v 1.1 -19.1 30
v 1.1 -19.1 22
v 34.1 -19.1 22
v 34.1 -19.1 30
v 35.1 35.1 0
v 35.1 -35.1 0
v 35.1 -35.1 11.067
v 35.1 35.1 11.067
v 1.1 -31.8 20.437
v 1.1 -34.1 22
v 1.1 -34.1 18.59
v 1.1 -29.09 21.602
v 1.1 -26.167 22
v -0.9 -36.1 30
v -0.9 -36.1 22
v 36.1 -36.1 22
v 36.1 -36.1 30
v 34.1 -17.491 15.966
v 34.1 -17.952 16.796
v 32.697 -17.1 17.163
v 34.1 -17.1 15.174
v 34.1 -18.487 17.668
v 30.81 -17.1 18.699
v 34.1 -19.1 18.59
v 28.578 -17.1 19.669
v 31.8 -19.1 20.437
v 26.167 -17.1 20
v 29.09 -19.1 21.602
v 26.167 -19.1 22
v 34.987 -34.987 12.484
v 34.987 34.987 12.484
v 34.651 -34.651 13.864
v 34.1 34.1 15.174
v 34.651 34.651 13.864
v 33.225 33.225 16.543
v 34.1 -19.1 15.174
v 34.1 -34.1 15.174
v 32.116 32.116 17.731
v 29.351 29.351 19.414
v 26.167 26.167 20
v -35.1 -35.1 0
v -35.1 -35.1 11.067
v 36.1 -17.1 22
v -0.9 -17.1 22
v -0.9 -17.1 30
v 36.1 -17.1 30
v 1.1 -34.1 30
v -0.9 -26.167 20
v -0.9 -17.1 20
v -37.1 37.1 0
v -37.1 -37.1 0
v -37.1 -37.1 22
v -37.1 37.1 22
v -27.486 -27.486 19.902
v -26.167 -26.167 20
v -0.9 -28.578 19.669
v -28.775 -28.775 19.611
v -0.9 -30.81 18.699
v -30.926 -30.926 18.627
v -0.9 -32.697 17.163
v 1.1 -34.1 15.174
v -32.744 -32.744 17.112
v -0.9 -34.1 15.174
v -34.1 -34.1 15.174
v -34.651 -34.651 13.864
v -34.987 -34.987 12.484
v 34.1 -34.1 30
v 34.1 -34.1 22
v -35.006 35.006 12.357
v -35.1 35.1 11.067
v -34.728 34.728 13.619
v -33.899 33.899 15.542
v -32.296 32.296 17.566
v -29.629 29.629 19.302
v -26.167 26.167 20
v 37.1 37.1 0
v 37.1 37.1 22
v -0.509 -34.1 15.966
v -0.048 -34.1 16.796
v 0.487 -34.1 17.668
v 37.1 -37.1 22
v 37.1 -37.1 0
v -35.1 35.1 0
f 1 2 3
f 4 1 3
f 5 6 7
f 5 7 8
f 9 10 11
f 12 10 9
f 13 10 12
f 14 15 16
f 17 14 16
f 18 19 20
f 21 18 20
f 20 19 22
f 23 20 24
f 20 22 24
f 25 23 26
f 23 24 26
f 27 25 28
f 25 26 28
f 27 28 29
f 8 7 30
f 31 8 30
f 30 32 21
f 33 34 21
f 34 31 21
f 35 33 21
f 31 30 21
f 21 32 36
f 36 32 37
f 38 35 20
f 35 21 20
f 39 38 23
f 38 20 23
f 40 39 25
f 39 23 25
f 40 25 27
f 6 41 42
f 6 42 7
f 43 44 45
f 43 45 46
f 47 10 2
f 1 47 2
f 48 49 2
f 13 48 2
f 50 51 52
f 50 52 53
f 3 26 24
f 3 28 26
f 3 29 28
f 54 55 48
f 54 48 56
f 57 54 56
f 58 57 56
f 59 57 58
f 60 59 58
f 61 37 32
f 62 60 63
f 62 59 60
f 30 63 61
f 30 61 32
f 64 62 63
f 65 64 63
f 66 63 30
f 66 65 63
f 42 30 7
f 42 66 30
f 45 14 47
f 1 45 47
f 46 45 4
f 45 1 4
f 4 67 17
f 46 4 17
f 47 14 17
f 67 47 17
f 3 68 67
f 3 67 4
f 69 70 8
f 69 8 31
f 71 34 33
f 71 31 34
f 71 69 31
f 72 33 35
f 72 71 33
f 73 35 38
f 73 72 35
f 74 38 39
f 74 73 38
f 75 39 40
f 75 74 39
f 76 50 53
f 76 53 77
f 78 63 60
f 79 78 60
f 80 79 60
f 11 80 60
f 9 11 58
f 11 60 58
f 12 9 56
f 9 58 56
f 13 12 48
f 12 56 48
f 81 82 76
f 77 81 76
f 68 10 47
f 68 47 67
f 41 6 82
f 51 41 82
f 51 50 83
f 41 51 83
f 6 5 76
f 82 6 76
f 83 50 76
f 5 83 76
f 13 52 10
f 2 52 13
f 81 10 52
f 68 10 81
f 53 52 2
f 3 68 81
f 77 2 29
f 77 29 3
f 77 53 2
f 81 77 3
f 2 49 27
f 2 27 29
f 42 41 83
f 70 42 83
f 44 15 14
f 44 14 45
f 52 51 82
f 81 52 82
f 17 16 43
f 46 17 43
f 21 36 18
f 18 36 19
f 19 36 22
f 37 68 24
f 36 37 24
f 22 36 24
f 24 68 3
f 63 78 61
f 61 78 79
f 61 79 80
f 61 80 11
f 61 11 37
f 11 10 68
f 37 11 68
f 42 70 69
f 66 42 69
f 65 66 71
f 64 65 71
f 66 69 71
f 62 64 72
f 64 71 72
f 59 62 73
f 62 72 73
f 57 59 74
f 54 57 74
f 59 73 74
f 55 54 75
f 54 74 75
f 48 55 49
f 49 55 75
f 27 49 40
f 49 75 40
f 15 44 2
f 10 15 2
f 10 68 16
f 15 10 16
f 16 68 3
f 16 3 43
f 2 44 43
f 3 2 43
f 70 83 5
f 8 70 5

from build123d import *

# Parameters (mm, degrees)
F0_W          = 70.2
F0_H          = 70.2
F1_DEPTH      = 20
F2_T          = 2
F3_W          = 33
F3_H          = 15
F4_DEPTH      = 25
F5_DEPTH      = 25
F6_T          = 2
F7_W          = 2
F7_H          = 6.9346216321
F7_W_2        = 33
F7_H_2        = 10.0653783679
F8_DEPTH      = 25
F9_T1_DEPTH   = 70.2
F9_T3_DEPTH   = 70.2
F9_T8_DEPTH   = 70.2
F9_T14_DEPTH  = 70.2
F9_T20_DEPTH  = 70.2
F9_T27_DEPTH  = 70.2
F9_T33_DEPTH  = 70.2
F9_T39_DEPTH  = 70.2
F9_T45_DEPTH  = 70.2
F9_T51_DEPTH  = 70.2
F9_T58_DEPTH  = 70.2
F9_T64_DEPTH  = 70.2
F10_T1_DEPTH  = 25.0674098192
F10_T6_ANGLE  = 95.6264745755
F10_T11_ANGLE = 95.6264745755
F10_T16_DEPTH = 14.2107757951


# Not quite as in the source:
# - a fillet or chamfer that OpenCascade refuses, or shapes differently, is made with other operations: its cross-section is extruded or revolved along the edge and cut away or added


with BuildPart() as f1:
    # F0 (on Top) → F1 (new body)
    with BuildSketch(Plane.XY):
        Rectangle(F0_W, F0_H)
    extrude(amount=F1_DEPTH)

    # F2
    f2_openings = [f1.faces().sort_by_distance(p)[0] for p in [
        (0, 0, 0),
    ]]
    offset(amount=F2_T, openings=f2_openings, kind=Kind.INTERSECTION)

    # F3 (on face) → F4 (cut)
    with BuildSketch(Plane.XY.offset(22)):
        with Locations((17.6, -26.6)):
            Rectangle(F3_W, F3_H)
    extrude(amount=-F4_DEPTH, mode=Mode.SUBTRACT)

    # F9: fillet of radius 8.9325901808 on 4 edges, made by hand

    # F9_s2 → F9_t1 (join)
    with BuildSketch(Plane.YZ.offset(-35.1)):
        with BuildLine():
            ThreePointArc((35.1, 11.0674098192), (32.4837049096, 17.3837049096), (26.1674098192, 20))
            Line((26.1674098192, 20), (35.1, 20))
            Line((35.1, 20), (35.1, 11.0674098192))
        make_face()
    extrude(amount=F9_T1_DEPTH)

    # F9_s4 → F9_t3 (join)
    with BuildSketch(Plane.XZ.offset(-35.1)):
        with BuildLine():
            ThreePointArc((-35.1, 11.0674098192), (-32.4837049096, 17.3837049096), (-26.1674098192, 20))
            Line((-26.1674098192, 20), (-35.1, 20))
            Line((-35.1, 20), (-35.1, 11.0674098192))
        make_face()
    extrude(amount=F9_T3_DEPTH)


with BuildPart() as f5:
    # F3 (on face) → F5 (new body)
    with BuildSketch(Plane.XY.offset(22)):
        with Locations((17.6, -26.6)):
            Rectangle(F3_W, F3_H)
    extrude(amount=F5_DEPTH)

    # F6
    f6_openings = [f5.faces().sort_by_distance(p)[0] for p in [
        (17.6, -26.6, 22),
    ]]
    offset(amount=F6_T, openings=f6_openings, kind=Kind.INTERSECTION)

    # F7 (on face) → F8 (cut)
    with BuildSketch(Plane.XZ.offset(36.1)):
        with Locations((0.1, 33.467310816)):
            Rectangle(F7_W, F7_H)
        with Locations((17.6, 33.467310816)):
            Rectangle(F7_W_2, F7_H)
        Polygon((-0.9, 49), (-0.9, 36.9346216321), (1.1, 36.9346216321), (1.1, 47), (34.1, 47), (34.1, 36.9346216321), (36.1, 36.9346216321), (36.1, 49), align=None)
        with Locations((35.1, 33.467310816)):
            Rectangle(F7_W, F7_H)
        with Locations((17.6, 41.967310816)):
            Rectangle(F7_W_2, F7_H_2)
    extrude(amount=-F8_DEPTH, mode=Mode.SUBTRACT)


with BuildPart() as f9_tool6:
    # F9_s7 → F9_t8 (new body)
    with BuildSketch(Plane.XZ.offset(35.1)):
        with BuildLine():
            ThreePointArc((35.1, 11.0674098192), (32.4837049096, 17.3837049096), (26.1674098192, 20))
            Line((26.1674098192, 20), (35.1, 20))
            Line((35.1, 20), (35.1, 11.0674098192))
        make_face()
    extrude(amount=-F9_T8_DEPTH)

    split(bisect_by=Plane.XZ.offset(34.1), keep=Keep.TOP)

    split(bisect_by=Plane.YZ.offset(34.1), keep=Keep.TOP)


with BuildPart() as f1_1:
    add(f1.part)

    # F9_t5: union F9_tool6
    add(f9_tool6.part)


with BuildPart() as f9_tool12:
    # F9_s13 → F9_t14 (new body)
    with BuildSketch(Plane.XZ.offset(35.1)):
        with BuildLine():
            ThreePointArc((35.1, 11.0674098192), (32.4837049096, 17.3837049096), (26.1674098192, 20))
            Line((26.1674098192, 20), (35.1, 20))
            Line((35.1, 20), (35.1, 11.0674098192))
        make_face()
    extrude(amount=-F9_T14_DEPTH)

    split(bisect_by=Plane.XZ.offset(34.1), keep=Keep.TOP)

    split(bisect_by=Plane.YZ.offset(34.1), keep=Keep.BOTTOM)


with BuildPart() as f1_2:
    add(f1_1.part)

    # F9_t11: union F9_tool12
    add(f9_tool12.part)


with BuildPart() as f9_tool18:
    # F9_s19 → F9_t20 (new body)
    with BuildSketch(Plane.XZ.offset(35.1)):
        with BuildLine():
            ThreePointArc((35.1, 11.0674098192), (32.4837049096, 17.3837049096), (26.1674098192, 20))
            Line((26.1674098192, 20), (35.1, 20))
            Line((35.1, 20), (35.1, 11.0674098192))
        make_face()
    extrude(amount=-F9_T20_DEPTH)

    split(bisect_by=Plane.XZ.offset(19.1), keep=Keep.TOP)

    split(bisect_by=Plane.XZ.offset(34.1), keep=Keep.BOTTOM)

    split(bisect_by=Plane.YZ.offset(34.1), keep=Keep.TOP)


with BuildPart() as f1_3:
    add(f1_2.part)

    # F9_t17: union F9_tool18
    add(f9_tool18.part)


with BuildPart() as f9_tool25:
    # F9_s26 → F9_t27 (new body)
    with BuildSketch(Plane.XZ.offset(35.1)):
        with BuildLine():
            ThreePointArc((35.1, 11.0674098192), (32.4837049096, 17.3837049096), (26.1674098192, 20))
            Line((26.1674098192, 20), (35.1, 20))
            Line((35.1, 20), (35.1, 11.0674098192))
        make_face()
    extrude(amount=-F9_T27_DEPTH)

    split(bisect_by=Plane.XZ.offset(19.1), keep=Keep.BOTTOM)

    split(bisect_by=Plane.YZ.offset(34.1), keep=Keep.TOP)


with BuildPart() as f1_4:
    add(f1_3.part)

    # F9_t24: union F9_tool25
    add(f9_tool25.part)


with BuildPart() as f9_tool31:
    # F9_s32 → F9_t33 (new body)
    with BuildSketch(Plane.XZ.offset(35.1)):
        with BuildLine():
            ThreePointArc((35.1, 11.0674098192), (32.4837049096, 17.3837049096), (26.1674098192, 20))
            Line((26.1674098192, 20), (35.1, 20))
            Line((35.1, 20), (35.1, 11.0674098192))
        make_face()
    extrude(amount=-F9_T33_DEPTH)

    split(bisect_by=Plane.XZ.offset(19.1), keep=Keep.BOTTOM)

    split(bisect_by=Plane.YZ.offset(34.1), keep=Keep.BOTTOM)


with BuildPart() as f1_5:
    add(f1_4.part)

    # F9_t30: union F9_tool31
    add(f9_tool31.part)


with BuildPart() as f9_tool37:
    # F9_s38 → F9_t39 (new body)
    with BuildSketch(Plane.YZ.offset(-35.1)):
        with BuildLine():
            ThreePointArc((-26.1674098192, 20), (-32.4837049096, 17.3837049096), (-35.1, 11.0674098192))
            Line((-35.1, 11.0674098192), (-35.1, 20))
            Line((-35.1, 20), (-26.1674098192, 20))
        make_face()
    extrude(amount=F9_T39_DEPTH)

    split(bisect_by=Plane.YZ.offset(1.1), keep=Keep.BOTTOM)

    split(bisect_by=Plane.XZ.offset(34.1), keep=Keep.BOTTOM)


with BuildPart() as f1_6:
    add(f1_5.part)

    # F9_t36: union F9_tool37
    add(f9_tool37.part)


with BuildPart() as f9_tool43:
    # F9_s44 → F9_t45 (new body)
    with BuildSketch(Plane.YZ.offset(-35.1)):
        with BuildLine():
            ThreePointArc((-26.1674098192, 20), (-32.4837049096, 17.3837049096), (-35.1, 11.0674098192))
            Line((-35.1, 11.0674098192), (-35.1, 20))
            Line((-35.1, 20), (-26.1674098192, 20))
        make_face()
    extrude(amount=F9_T45_DEPTH)

    split(bisect_by=Plane.YZ.offset(1.1), keep=Keep.BOTTOM)

    split(bisect_by=Plane.XZ.offset(34.1), keep=Keep.TOP)


with BuildPart() as f1_7:
    add(f1_6.part)

    # F9_t42: union F9_tool43
    add(f9_tool43.part)


with BuildPart() as f9_tool49:
    # F9_s50 → F9_t51 (new body)
    with BuildSketch(Plane.YZ.offset(-35.1)):
        with BuildLine():
            ThreePointArc((-26.1674098192, 20), (-32.4837049096, 17.3837049096), (-35.1, 11.0674098192))
            Line((-35.1, 11.0674098192), (-35.1, 20))
            Line((-35.1, 20), (-26.1674098192, 20))
        make_face()
    extrude(amount=F9_T51_DEPTH)

    split(bisect_by=Plane.YZ.offset(1.1), keep=Keep.TOP)

    split(bisect_by=Plane.XZ.offset(34.1), keep=Keep.TOP)

    split(bisect_by=Plane.YZ.offset(34.1), keep=Keep.BOTTOM)


with BuildPart() as f1_8:
    add(f1_7.part)

    # F9_t48: union F9_tool49
    add(f9_tool49.part)


with BuildPart() as f9_tool56:
    # F9_s57 → F9_t58 (new body)
    with BuildSketch(Plane.YZ.offset(-35.1)):
        with BuildLine():
            ThreePointArc((-26.1674098192, 20), (-32.4837049096, 17.3837049096), (-35.1, 11.0674098192))
            Line((-35.1, 11.0674098192), (-35.1, 20))
            Line((-35.1, 20), (-26.1674098192, 20))
        make_face()
    extrude(amount=F9_T58_DEPTH)

    split(bisect_by=Plane.XZ.offset(34.1), keep=Keep.BOTTOM)

    split(bisect_by=Plane.YZ.offset(34.1), keep=Keep.TOP)


with BuildPart() as f1_9:
    add(f1_8.part)

    # F9_t55: union F9_tool56
    add(f9_tool56.part)


with BuildPart() as f9_tool62:
    # F9_s63 → F9_t64 (new body)
    with BuildSketch(Plane.YZ.offset(-35.1)):
        with BuildLine():
            ThreePointArc((-26.1674098192, 20), (-32.4837049096, 17.3837049096), (-35.1, 11.0674098192))
            Line((-35.1, 11.0674098192), (-35.1, 20))
            Line((-35.1, 20), (-26.1674098192, 20))
        make_face()
    extrude(amount=F9_T64_DEPTH)

    split(bisect_by=Plane.XZ.offset(34.1), keep=Keep.TOP)

    split(bisect_by=Plane.YZ.offset(34.1), keep=Keep.TOP)


with BuildPart() as f1_10:
    add(f1_9.part)

    # F9_t61: union F9_tool62
    add(f9_tool62.part)

    # F10: chamfer of 2 on 6 edges, made by hand

    # F10_s2 → F10_t1 (cut)
    with BuildSketch(Plane.YZ.offset(1.1)):
        Polygon((-17.1, 20), (-19.1, 22), (-19.1, 20), align=None)
    extrude(amount=F10_T1_DEPTH, mode=Mode.SUBTRACT)


with BuildPart() as f10_tool4:
    # F10_s5 → F10_t6 (revolve)
    with BuildSketch(Plane(origin=(1.331382753, 0, 13.5141903658), x_dir=(0, 1, 0), z_dir=(-0.0980427526, 0, -0.9951822038))):
        Polygon((-17.1, 33.8888514287), (-19.1, 35.8888514287), (-19.1, 33.8888514287), align=None)
    revolve(axis=Axis((26.1674098192, -19.1, 11.0674098192), (0, -1, 0)), revolution_arc=F10_T6_ANGLE)

    split(bisect_by=Plane.YZ.offset(34.1), keep=Keep.BOTTOM)


with BuildPart() as f1_11:
    add(f1_10.part)

    # F10_t3: cut F10_tool4
    add(f10_tool4.part, mode=Mode.SUBTRACT)


with BuildPart() as f10_tool9:
    # F10_s10 → F10_t11 (revolve)
    with BuildSketch(Plane(origin=(0, -1.331382753, 13.5141903658), x_dir=(1, 0, 0), z_dir=(0, 0.0980427526, -0.9951822038))):
        Polygon((1.1, 35.8888514287), (-0.9, 33.8888514287), (1.1, 33.8888514287), align=None)
    revolve(axis=Axis((1.1, -26.1674098192, 11.0674098192), (-1, 0, 0)), revolution_arc=F10_T11_ANGLE)

    split(bisect_by=Plane.XZ.offset(34.1), keep=Keep.BOTTOM)


with BuildPart() as f1_12:
    add(f1_11.part)

    # F10_t8: cut F10_tool9
    add(f10_tool9.part, mode=Mode.SUBTRACT)


with BuildPart() as f10_tool14:
    # F10_s15 → F10_t16 (new body)
    with BuildSketch(Plane.XZ.offset(11.9566340241)):
        Polygon((-0.9, 20), (1.1, 22), (1.1, 20), align=None)
    extrude(amount=F10_T16_DEPTH)

    split(bisect_by=Plane(origin=(0, 1.45, 1.45), x_dir=(1, 0, 0), z_dir=(0, -0.7071067812, -0.7071067812)), keep=Keep.TOP)


with BuildPart() as f1_13:
    add(f1_12.part)

    # F10_t13: cut F10_tool14
    add(f10_tool14.part, mode=Mode.SUBTRACT)


solid = Compound([f5.part, f1_13.part])
